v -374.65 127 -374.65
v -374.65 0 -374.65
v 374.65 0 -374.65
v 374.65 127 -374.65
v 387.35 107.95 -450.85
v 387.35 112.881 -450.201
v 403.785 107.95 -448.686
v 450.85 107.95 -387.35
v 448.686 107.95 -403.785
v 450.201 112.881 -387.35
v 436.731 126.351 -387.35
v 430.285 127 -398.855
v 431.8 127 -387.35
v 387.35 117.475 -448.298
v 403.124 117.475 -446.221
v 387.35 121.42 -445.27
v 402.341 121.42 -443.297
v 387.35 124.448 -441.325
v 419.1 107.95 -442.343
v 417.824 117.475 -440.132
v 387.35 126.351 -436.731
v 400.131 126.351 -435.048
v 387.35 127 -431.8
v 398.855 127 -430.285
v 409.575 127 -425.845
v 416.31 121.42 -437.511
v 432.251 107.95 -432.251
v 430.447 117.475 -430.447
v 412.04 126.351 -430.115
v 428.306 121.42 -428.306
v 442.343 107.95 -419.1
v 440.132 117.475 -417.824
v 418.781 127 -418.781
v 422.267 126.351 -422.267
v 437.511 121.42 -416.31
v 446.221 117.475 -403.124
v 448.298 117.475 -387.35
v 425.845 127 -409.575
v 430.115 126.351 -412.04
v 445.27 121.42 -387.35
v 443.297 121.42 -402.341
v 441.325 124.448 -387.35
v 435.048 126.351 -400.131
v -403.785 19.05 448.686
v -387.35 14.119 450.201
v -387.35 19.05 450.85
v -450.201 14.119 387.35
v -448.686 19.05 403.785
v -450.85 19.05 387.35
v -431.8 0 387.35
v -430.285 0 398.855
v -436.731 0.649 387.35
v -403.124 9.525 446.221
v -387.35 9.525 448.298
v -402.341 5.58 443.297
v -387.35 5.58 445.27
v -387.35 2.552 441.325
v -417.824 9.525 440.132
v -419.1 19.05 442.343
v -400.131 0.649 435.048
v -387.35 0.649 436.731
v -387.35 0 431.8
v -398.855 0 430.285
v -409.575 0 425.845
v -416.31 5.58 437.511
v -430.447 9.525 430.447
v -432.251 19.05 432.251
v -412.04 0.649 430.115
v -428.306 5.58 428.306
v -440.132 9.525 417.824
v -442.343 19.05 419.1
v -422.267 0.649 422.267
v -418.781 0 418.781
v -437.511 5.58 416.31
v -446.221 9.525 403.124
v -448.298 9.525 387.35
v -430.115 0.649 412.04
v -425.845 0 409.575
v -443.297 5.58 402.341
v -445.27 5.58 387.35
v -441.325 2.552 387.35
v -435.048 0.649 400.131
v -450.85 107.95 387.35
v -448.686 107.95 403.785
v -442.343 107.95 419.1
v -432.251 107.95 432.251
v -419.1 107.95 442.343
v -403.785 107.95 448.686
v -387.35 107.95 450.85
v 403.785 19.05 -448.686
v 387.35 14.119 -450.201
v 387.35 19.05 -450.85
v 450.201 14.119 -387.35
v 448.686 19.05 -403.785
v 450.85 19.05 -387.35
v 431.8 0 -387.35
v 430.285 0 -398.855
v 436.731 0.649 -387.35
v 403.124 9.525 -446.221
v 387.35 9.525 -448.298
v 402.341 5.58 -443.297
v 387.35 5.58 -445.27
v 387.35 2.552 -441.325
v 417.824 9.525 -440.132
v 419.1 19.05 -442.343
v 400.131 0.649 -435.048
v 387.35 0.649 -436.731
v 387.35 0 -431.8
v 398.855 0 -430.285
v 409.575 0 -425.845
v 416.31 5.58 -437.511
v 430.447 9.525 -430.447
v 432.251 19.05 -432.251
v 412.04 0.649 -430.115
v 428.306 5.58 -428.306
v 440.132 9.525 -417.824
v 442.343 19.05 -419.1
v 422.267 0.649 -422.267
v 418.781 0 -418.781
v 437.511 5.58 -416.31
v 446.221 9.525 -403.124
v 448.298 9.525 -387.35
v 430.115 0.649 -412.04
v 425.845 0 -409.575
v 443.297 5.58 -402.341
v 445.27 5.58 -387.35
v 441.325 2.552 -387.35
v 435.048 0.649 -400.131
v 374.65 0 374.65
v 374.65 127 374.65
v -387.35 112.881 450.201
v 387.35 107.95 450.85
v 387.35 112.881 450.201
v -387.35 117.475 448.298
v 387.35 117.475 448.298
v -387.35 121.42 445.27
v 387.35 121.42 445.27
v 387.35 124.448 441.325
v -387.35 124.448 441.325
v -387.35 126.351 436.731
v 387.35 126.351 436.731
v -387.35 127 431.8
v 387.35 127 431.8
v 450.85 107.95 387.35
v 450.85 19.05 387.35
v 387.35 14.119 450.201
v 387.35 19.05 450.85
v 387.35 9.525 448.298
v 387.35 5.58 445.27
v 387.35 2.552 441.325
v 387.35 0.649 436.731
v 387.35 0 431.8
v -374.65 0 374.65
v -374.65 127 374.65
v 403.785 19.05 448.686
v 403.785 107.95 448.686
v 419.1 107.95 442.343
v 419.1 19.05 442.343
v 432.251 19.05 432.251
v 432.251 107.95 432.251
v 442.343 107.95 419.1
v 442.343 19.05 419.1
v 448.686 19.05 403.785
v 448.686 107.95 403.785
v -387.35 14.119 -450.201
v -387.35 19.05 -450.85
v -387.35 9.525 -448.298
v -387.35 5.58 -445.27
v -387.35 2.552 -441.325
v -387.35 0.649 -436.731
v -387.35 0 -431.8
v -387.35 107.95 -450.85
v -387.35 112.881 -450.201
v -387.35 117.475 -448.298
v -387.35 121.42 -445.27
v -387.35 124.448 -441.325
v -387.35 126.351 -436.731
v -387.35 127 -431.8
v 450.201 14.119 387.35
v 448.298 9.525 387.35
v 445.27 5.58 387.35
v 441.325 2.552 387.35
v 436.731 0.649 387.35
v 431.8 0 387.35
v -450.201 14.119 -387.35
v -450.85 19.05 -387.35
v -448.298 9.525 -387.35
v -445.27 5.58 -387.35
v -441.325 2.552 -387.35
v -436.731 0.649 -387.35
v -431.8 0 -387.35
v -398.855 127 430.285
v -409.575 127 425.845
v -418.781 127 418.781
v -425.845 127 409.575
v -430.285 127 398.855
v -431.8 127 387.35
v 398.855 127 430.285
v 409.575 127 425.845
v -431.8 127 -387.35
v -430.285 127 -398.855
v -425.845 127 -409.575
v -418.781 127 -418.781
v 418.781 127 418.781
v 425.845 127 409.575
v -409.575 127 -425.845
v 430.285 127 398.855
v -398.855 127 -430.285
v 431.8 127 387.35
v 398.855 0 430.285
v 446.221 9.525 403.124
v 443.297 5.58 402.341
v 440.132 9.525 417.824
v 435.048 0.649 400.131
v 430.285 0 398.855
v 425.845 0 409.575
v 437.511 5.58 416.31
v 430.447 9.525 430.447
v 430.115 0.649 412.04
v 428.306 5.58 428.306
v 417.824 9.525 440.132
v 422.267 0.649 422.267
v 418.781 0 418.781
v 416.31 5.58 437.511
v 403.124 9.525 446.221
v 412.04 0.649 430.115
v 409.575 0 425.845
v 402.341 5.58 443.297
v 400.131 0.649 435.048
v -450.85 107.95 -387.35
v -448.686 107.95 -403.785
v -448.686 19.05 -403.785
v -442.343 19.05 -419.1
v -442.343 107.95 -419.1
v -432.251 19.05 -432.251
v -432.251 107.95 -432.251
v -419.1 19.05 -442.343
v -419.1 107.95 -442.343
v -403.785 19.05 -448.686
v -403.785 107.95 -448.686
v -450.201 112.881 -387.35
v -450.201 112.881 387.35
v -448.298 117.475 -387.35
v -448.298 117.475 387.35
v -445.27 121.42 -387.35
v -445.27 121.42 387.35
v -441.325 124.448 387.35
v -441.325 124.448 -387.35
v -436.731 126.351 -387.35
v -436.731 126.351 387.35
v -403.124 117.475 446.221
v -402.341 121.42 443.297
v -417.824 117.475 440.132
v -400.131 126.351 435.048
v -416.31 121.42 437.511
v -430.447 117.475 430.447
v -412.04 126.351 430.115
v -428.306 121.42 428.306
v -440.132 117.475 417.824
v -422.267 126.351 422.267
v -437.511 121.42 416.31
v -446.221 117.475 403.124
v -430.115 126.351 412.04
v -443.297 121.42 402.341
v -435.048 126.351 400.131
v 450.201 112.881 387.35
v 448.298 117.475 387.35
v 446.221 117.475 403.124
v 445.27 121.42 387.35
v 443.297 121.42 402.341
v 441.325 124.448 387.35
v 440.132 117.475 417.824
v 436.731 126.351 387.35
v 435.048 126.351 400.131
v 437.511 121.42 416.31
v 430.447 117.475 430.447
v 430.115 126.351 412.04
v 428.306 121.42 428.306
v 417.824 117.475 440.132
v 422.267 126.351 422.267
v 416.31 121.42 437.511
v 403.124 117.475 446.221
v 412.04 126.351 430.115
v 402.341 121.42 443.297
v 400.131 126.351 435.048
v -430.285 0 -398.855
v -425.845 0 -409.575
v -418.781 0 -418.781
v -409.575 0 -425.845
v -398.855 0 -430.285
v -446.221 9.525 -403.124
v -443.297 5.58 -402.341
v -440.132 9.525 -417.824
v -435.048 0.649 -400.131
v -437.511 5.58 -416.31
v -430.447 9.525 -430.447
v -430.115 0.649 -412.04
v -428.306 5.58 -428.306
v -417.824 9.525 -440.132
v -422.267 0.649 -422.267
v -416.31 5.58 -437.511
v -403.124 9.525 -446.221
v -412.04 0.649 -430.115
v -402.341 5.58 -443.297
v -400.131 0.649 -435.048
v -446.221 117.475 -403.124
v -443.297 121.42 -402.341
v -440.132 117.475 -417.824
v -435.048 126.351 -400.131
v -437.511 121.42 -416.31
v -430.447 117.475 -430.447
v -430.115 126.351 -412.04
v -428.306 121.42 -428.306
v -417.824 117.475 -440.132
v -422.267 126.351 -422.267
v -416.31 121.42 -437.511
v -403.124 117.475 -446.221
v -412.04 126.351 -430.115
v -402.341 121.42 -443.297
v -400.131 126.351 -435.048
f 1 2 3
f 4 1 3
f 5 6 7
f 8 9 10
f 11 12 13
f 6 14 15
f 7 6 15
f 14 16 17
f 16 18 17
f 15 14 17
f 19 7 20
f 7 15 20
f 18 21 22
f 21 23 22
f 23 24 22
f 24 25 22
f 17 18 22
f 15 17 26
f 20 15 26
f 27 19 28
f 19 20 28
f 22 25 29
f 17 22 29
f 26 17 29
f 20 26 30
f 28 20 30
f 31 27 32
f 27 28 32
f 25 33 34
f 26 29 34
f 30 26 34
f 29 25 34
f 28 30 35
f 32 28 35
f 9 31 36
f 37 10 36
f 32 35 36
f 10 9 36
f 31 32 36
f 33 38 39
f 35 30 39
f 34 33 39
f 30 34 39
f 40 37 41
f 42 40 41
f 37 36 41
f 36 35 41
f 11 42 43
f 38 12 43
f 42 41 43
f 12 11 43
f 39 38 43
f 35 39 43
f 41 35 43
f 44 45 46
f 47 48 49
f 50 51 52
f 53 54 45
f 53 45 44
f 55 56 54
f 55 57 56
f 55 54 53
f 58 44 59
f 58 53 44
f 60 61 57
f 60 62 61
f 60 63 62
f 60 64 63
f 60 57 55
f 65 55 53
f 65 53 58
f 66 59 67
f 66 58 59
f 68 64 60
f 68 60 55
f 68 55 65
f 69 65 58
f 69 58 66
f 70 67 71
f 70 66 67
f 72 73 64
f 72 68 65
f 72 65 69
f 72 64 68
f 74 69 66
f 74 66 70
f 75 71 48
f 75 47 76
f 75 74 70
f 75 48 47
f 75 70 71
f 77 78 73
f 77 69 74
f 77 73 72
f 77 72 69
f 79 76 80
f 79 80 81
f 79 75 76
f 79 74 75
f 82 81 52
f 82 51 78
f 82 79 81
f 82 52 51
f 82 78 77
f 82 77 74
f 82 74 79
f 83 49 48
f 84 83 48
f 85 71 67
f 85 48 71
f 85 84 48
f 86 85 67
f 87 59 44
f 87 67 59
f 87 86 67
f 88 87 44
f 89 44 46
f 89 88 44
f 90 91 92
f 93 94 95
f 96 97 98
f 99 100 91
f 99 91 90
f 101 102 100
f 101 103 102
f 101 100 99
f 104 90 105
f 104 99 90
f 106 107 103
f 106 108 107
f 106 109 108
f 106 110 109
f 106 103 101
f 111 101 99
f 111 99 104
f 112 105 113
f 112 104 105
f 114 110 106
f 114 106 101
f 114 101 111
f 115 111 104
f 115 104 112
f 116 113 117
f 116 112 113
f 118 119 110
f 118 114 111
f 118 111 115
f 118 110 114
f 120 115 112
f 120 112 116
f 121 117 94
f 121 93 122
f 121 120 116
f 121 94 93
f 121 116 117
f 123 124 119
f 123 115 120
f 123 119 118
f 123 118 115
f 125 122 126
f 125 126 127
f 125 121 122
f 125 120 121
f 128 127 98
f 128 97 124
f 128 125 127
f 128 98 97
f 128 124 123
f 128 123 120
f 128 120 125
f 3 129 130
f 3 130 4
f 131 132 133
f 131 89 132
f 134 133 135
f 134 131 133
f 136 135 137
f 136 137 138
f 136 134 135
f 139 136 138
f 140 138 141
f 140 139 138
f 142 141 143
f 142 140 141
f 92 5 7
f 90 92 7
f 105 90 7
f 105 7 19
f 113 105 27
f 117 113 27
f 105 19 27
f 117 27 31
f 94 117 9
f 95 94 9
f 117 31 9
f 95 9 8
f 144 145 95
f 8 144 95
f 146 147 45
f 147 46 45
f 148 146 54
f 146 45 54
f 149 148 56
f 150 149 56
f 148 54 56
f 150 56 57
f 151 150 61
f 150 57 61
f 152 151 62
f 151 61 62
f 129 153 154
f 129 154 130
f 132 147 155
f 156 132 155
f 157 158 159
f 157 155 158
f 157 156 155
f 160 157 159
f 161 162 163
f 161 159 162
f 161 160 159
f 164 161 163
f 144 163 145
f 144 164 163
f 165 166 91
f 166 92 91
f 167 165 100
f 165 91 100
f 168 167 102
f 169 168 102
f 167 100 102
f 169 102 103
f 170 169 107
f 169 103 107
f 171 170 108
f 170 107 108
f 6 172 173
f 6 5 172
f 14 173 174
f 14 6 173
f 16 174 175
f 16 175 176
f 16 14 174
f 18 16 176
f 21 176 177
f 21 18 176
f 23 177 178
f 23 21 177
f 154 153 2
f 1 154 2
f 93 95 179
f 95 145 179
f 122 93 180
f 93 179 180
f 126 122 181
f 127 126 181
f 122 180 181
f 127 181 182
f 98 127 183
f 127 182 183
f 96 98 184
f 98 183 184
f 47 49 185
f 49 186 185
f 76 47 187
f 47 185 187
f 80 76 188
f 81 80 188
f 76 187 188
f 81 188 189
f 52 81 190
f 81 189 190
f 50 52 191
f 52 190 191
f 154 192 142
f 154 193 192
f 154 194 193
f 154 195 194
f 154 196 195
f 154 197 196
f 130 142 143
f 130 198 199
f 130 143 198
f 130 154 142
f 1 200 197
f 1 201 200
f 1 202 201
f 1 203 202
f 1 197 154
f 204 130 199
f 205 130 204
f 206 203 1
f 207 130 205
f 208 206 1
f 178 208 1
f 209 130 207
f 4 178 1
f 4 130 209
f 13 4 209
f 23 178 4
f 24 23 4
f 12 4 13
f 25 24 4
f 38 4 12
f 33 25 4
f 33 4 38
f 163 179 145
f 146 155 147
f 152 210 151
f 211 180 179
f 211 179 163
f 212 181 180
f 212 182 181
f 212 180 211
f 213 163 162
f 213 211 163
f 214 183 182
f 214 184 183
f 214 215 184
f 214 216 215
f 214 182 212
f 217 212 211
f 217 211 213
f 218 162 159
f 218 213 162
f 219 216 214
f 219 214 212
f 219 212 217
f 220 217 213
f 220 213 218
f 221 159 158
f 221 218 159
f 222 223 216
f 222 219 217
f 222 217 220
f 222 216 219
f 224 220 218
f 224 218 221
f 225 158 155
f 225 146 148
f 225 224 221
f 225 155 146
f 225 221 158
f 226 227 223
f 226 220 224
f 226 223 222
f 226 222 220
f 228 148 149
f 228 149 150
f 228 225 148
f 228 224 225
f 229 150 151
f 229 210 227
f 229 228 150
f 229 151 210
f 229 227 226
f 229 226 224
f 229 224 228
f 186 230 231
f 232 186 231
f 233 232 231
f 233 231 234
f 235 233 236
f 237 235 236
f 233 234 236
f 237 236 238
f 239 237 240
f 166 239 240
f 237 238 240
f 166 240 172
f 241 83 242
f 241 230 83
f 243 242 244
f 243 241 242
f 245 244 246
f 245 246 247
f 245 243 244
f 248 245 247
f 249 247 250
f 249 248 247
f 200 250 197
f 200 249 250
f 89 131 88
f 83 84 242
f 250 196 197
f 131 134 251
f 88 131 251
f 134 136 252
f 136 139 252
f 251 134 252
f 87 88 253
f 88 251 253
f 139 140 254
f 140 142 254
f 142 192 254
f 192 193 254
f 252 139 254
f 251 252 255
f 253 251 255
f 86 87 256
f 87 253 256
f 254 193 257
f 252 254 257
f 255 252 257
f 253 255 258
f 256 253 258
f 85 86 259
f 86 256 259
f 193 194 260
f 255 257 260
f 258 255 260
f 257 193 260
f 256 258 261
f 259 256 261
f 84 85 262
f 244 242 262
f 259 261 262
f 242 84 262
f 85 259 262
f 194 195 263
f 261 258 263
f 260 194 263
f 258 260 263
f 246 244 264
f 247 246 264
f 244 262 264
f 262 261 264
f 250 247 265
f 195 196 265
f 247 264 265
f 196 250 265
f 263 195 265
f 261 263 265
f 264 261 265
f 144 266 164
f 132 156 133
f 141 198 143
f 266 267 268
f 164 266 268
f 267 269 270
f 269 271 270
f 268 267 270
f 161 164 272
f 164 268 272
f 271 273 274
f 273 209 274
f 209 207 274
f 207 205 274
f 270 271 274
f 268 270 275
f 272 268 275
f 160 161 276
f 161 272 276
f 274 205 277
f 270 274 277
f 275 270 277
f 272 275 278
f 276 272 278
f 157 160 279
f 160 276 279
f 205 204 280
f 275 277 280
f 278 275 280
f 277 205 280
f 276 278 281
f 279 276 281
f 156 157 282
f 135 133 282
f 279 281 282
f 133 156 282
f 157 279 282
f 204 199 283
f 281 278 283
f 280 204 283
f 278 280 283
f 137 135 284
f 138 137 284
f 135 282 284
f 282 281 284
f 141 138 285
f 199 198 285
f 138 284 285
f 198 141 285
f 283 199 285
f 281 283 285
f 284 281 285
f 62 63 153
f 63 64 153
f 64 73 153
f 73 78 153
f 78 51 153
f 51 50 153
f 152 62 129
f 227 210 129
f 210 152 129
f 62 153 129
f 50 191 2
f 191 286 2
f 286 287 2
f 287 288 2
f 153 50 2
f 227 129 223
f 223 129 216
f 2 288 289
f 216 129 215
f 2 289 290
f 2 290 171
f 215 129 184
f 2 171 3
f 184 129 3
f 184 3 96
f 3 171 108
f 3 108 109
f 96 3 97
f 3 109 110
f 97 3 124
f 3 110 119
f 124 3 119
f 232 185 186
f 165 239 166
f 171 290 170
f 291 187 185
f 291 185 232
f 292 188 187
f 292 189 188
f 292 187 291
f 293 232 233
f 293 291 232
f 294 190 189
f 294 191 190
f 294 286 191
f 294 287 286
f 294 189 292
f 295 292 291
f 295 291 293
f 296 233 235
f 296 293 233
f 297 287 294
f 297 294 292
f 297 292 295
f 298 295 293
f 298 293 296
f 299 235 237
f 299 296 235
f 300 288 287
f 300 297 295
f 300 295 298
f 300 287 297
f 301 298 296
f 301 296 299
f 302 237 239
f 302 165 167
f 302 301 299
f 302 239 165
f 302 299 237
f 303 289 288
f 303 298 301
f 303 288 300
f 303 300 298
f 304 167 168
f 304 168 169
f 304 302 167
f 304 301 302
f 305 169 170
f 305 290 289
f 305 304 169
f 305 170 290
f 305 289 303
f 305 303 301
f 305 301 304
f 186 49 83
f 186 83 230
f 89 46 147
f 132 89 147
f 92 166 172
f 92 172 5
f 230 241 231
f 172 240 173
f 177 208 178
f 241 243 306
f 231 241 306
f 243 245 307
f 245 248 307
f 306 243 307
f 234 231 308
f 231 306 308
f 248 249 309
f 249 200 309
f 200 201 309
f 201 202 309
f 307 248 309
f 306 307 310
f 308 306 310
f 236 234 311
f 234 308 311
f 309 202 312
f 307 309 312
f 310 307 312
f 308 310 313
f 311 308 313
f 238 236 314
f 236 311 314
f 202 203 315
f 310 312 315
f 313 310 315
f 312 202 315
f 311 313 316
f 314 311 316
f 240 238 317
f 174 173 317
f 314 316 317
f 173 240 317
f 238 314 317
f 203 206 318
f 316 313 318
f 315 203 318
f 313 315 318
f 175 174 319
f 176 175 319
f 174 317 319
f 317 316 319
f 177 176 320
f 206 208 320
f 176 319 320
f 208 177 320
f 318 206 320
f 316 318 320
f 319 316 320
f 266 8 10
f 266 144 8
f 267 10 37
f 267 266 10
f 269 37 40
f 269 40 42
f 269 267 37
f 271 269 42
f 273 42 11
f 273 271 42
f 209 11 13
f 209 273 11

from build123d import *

# Parameters (mm, degrees)
SKETCH1_W           = 901.7
SKETCH1_H           = 901.7
SKETCH1_W_2         = 749.3
SKETCH1_H_2         = 749.3
BOSS_EXTRUDE1_DEPTH = 127
FILLET1_R           = 63.5
FILLET2_R           = 19.05


with BuildPart() as part:
    # Sketch1 → Boss-Extrude1 (new body)
    with BuildSketch(Plane(origin=(0, 0, 0), x_dir=(1, 0, 0), z_dir=(0, 1, 0))):
        Rectangle(SKETCH1_W, SKETCH1_H)
        Rectangle(SKETCH1_W_2, SKETCH1_H_2, mode=Mode.SUBTRACT)
    extrude(amount=BOSS_EXTRUDE1_DEPTH)

    # Fillet1
    fillet1_edges = [part.edges().sort_by_distance(p)[0] for p in [
        (-450.85, 63.5, -450.85),
        (450.85, 63.5, -450.85),
        (450.85, 63.5, 450.85),
        (-450.85, 63.5, 450.85),
    ]]
    fillet(fillet1_edges, radius=FILLET1_R)

    # Fillet2
    fillet2_edges = [part.edges().sort_by_distance(p)[0] for p in [
        (-450.85, 0, 0),
        (-450.85, 127, 0),
        (0, 0, -450.85),
        (450.85, 0, 0),
        (0, 0, 450.85),
        (-432.251280605, 0, 432.251280605),
        (432.251280605, 0, 432.251280605),
        (432.251280605, 0, -432.251280605),
        (-432.251280605, 0, -432.251280605),
        (0, 127, -450.85),
        (0, 127, 450.85),
        (450.85, 127, 0),
        (-432.251280605, 127, 432.251280605),
        (432.251280605, 127, 432.251280605),
        (432.251280605, 127, -432.251280605),
        (-432.251280605, 127, -432.251280605),
    ]]
    fillet(fillet2_edges, radius=FILLET2_R)


solid = part.part
